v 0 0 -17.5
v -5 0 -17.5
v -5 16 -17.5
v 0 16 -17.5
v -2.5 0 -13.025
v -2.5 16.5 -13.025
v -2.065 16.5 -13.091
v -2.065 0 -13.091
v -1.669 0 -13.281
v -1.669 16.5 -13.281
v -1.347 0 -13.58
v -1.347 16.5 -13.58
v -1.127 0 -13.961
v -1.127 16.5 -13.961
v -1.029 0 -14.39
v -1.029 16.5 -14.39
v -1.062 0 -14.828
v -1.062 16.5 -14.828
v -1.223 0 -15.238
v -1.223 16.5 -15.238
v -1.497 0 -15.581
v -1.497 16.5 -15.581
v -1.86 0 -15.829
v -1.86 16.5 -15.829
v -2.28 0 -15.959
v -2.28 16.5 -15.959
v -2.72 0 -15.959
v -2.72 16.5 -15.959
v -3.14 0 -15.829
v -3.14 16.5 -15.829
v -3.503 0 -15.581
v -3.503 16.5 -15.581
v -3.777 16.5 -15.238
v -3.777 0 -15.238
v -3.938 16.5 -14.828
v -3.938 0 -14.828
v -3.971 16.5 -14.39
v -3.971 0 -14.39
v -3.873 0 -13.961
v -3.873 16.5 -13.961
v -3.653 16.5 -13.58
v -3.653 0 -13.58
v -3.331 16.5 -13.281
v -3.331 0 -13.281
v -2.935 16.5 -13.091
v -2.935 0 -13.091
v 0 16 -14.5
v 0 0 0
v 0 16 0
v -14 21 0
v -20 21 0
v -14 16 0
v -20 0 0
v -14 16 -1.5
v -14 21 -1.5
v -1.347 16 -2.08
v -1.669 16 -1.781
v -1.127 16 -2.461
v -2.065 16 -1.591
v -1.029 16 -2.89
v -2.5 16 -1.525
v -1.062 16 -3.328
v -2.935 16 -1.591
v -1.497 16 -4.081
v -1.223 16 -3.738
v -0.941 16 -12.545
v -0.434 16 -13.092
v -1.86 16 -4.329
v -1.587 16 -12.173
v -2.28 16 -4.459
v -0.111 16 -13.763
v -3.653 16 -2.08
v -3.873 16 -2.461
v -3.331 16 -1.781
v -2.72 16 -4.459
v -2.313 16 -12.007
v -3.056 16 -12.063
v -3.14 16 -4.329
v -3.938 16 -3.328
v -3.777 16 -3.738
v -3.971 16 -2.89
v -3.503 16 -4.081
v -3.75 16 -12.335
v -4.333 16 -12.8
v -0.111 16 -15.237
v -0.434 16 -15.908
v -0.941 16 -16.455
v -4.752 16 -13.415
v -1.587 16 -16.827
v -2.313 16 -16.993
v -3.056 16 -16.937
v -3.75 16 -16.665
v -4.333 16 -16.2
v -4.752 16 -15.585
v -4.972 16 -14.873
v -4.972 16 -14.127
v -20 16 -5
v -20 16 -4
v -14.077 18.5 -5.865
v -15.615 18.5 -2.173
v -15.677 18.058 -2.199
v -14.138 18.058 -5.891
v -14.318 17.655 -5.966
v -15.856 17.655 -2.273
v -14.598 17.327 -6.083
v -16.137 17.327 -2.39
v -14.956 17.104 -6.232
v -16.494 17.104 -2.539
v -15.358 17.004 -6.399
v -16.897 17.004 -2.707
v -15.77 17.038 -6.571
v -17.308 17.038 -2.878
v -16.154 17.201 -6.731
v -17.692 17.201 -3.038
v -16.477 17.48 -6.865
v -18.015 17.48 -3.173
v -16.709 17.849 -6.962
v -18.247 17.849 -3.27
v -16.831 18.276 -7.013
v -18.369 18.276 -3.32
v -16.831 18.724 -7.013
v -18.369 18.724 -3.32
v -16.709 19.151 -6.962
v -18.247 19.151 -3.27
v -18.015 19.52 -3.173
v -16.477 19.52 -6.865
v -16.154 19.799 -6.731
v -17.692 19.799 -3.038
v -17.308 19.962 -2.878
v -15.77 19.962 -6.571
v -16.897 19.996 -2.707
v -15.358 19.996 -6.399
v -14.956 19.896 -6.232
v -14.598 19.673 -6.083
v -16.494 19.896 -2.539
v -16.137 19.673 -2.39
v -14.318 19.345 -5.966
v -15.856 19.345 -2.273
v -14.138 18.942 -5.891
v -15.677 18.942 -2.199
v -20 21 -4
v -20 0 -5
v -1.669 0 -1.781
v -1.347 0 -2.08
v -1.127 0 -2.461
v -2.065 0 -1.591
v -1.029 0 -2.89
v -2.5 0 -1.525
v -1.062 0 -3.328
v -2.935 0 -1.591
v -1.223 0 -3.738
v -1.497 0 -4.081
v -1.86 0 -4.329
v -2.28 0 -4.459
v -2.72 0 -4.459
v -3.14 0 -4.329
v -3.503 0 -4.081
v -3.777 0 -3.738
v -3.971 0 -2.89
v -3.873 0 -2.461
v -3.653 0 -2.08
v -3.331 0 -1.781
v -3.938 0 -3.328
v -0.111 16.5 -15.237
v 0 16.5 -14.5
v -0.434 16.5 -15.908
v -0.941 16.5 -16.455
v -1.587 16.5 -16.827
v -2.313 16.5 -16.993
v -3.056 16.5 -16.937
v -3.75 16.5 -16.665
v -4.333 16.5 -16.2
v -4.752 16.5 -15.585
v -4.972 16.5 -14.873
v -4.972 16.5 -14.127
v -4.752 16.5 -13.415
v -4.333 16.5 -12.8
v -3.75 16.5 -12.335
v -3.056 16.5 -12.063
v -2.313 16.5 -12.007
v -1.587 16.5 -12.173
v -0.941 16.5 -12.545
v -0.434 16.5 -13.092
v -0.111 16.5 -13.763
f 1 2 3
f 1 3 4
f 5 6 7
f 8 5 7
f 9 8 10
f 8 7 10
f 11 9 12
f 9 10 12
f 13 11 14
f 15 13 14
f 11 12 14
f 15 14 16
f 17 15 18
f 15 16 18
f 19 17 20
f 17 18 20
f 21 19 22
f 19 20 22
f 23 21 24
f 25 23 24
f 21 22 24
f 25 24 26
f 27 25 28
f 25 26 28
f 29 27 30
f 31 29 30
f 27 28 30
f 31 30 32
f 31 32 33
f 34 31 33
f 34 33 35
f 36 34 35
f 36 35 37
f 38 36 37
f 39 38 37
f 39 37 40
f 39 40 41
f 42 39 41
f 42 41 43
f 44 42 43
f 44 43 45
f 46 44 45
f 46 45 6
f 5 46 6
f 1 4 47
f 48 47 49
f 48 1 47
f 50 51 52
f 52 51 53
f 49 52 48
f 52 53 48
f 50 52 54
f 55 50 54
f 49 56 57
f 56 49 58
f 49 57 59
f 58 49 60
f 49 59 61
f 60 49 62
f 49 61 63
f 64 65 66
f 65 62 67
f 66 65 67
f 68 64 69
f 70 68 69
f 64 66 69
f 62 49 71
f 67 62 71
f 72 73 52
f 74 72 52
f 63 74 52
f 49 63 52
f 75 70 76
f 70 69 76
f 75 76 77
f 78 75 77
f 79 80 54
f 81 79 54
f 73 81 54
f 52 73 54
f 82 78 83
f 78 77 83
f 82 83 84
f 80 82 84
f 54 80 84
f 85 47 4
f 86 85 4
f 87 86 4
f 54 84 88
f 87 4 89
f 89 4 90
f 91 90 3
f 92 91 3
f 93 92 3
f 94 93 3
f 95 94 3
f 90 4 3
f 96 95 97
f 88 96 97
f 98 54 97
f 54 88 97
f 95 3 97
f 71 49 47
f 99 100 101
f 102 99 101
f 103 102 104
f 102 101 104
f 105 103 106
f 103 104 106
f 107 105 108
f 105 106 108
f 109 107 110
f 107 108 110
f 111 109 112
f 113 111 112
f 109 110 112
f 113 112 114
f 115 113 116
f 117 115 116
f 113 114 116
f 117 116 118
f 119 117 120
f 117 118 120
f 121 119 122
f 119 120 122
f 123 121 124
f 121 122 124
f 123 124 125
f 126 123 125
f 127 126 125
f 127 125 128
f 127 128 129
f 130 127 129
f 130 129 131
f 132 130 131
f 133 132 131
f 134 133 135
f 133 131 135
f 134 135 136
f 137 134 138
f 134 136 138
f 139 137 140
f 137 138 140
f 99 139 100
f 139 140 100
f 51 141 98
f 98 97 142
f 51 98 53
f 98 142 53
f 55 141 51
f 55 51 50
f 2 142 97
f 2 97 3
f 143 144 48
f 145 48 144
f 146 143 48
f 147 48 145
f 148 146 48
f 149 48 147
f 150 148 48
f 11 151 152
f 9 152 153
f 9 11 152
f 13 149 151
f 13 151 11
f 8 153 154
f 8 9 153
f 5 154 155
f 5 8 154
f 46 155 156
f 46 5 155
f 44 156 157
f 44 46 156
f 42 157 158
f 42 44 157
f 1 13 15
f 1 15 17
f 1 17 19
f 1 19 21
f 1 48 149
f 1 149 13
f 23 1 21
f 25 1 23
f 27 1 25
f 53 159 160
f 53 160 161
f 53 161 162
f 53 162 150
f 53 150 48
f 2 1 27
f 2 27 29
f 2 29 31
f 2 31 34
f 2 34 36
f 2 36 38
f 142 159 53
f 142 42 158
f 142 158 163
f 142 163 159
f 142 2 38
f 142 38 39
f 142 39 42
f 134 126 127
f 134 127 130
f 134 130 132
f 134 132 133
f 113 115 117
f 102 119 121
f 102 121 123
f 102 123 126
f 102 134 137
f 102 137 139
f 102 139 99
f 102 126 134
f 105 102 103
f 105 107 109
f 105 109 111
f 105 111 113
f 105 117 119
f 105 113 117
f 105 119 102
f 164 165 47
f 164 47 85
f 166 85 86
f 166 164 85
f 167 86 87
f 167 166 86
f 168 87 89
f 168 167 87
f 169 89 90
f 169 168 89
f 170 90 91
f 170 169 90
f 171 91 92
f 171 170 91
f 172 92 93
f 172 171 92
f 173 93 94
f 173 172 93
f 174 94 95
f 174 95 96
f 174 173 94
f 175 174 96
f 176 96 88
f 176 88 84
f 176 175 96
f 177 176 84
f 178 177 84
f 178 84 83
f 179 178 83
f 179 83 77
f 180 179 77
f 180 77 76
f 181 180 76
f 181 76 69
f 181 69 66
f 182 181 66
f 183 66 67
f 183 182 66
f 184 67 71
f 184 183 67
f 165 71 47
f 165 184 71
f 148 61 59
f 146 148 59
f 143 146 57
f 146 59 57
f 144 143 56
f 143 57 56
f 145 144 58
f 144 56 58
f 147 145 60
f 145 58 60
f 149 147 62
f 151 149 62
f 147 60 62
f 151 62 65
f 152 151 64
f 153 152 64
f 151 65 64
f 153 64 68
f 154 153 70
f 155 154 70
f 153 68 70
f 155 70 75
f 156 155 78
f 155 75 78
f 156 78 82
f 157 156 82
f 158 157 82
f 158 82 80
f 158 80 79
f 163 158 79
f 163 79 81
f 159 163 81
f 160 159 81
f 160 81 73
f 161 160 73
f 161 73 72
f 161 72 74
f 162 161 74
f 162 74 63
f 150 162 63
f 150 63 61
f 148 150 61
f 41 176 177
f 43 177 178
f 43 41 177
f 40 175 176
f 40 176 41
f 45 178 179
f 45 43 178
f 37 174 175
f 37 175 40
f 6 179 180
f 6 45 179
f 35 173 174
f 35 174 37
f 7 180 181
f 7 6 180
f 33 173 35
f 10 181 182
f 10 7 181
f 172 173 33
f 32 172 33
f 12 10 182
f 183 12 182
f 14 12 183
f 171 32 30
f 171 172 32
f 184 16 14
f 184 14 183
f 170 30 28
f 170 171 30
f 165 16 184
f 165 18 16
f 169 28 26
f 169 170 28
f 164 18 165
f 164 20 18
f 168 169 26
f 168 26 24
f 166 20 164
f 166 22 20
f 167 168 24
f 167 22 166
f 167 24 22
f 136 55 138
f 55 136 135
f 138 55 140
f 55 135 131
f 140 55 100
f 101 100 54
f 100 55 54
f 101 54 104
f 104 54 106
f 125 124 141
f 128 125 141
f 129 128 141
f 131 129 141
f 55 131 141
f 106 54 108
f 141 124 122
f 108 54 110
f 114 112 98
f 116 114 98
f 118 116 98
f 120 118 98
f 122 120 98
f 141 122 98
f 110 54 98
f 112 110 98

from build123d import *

# Parameters (mm, degrees)
EXTRUDE_1_DEPTH     = 16
SKETCH_3_R          = 1.475
CUT_EXTRUDE_1_DEPTH = 32.020154738
EXTRUDE_2_DEPTH     = 5
EXTRUDE_START       = 0.5
SKETCH_5_R          = 2.5
SKETCH_5_R_2        = 1.475
EXTRUDE_3_DEPTH     = 0.5
SKETCH_6_R          = 1.5
EXTRUDE_4_DEPTH     = 4


with BuildPart() as part:
    # Эскиз2 → Бобышка-Вытянуть1 (new body)
    with BuildSketch(Plane(origin=(0, 0, 0), x_dir=(1, 0, 0), z_dir=(0, 1, 0))):
        Polygon((-20, 5), (-5, 17.5), (0, 17.5), (0, 0), (-20, 0), align=None)
    extrude(amount=EXTRUDE_1_DEPTH)

    # Эскиз3 → Вырез-Вытянуть1 (cut, through all)
    with BuildSketch(Plane(origin=(0, 16, 0), x_dir=(1, 0, 0), z_dir=(0, 1, 0))):
        with Locations(Location((-2.5, 14.5, 0), (0, 0, 270))):
            Circle(SKETCH_3_R)
        with Locations(Location((-2.5, 3, 0), (0, 0, 270))):
            Circle(SKETCH_3_R)
    extrude(amount=-CUT_EXTRUDE_1_DEPTH, mode=Mode.SUBTRACT)

    # Эскиз4 → Бобышка-Вытянуть2 (add)
    with BuildSketch(Plane(origin=(0, 16, 0), x_dir=(1, 0, 0), z_dir=(0, 1, 0))):
        Polygon((-20, 4), (-20, 0), (-14, 0), (-14, 1.5), align=None)
    extrude(amount=EXTRUDE_2_DEPTH)

    # Эскиз5 → Бобышка-Вытянуть3 (add)
    with BuildSketch(Plane(origin=(0, 16, 0), x_dir=(1, 0, 0), z_dir=(0, 1, 0)).offset(EXTRUDE_START)):
        with Locations((-2.5, 14.5)):
            Circle(SKETCH_5_R)
        with Locations(Location((-2.5, 14.5, 0), (0, 0, 270))):
            Circle(SKETCH_5_R_2, mode=Mode.SUBTRACT)
    extrude(amount=-EXTRUDE_3_DEPTH)

    # Эскиз6 → Бобышка-Вытянуть4 (add)
    with BuildSketch(Plane(origin=(-1.538461538, 0, 3.692307692), x_dir=(-0.9230769230769231, 0, -0.3846153846153845), z_dir=(0.3846153846153845, 0, -0.9230769230769231))):
        with Locations(Location((16.75, 18.5, 0), (0, 0, 180))):
            Circle(SKETCH_6_R)
    extrude(amount=EXTRUDE_4_DEPTH)


solid = part.part
